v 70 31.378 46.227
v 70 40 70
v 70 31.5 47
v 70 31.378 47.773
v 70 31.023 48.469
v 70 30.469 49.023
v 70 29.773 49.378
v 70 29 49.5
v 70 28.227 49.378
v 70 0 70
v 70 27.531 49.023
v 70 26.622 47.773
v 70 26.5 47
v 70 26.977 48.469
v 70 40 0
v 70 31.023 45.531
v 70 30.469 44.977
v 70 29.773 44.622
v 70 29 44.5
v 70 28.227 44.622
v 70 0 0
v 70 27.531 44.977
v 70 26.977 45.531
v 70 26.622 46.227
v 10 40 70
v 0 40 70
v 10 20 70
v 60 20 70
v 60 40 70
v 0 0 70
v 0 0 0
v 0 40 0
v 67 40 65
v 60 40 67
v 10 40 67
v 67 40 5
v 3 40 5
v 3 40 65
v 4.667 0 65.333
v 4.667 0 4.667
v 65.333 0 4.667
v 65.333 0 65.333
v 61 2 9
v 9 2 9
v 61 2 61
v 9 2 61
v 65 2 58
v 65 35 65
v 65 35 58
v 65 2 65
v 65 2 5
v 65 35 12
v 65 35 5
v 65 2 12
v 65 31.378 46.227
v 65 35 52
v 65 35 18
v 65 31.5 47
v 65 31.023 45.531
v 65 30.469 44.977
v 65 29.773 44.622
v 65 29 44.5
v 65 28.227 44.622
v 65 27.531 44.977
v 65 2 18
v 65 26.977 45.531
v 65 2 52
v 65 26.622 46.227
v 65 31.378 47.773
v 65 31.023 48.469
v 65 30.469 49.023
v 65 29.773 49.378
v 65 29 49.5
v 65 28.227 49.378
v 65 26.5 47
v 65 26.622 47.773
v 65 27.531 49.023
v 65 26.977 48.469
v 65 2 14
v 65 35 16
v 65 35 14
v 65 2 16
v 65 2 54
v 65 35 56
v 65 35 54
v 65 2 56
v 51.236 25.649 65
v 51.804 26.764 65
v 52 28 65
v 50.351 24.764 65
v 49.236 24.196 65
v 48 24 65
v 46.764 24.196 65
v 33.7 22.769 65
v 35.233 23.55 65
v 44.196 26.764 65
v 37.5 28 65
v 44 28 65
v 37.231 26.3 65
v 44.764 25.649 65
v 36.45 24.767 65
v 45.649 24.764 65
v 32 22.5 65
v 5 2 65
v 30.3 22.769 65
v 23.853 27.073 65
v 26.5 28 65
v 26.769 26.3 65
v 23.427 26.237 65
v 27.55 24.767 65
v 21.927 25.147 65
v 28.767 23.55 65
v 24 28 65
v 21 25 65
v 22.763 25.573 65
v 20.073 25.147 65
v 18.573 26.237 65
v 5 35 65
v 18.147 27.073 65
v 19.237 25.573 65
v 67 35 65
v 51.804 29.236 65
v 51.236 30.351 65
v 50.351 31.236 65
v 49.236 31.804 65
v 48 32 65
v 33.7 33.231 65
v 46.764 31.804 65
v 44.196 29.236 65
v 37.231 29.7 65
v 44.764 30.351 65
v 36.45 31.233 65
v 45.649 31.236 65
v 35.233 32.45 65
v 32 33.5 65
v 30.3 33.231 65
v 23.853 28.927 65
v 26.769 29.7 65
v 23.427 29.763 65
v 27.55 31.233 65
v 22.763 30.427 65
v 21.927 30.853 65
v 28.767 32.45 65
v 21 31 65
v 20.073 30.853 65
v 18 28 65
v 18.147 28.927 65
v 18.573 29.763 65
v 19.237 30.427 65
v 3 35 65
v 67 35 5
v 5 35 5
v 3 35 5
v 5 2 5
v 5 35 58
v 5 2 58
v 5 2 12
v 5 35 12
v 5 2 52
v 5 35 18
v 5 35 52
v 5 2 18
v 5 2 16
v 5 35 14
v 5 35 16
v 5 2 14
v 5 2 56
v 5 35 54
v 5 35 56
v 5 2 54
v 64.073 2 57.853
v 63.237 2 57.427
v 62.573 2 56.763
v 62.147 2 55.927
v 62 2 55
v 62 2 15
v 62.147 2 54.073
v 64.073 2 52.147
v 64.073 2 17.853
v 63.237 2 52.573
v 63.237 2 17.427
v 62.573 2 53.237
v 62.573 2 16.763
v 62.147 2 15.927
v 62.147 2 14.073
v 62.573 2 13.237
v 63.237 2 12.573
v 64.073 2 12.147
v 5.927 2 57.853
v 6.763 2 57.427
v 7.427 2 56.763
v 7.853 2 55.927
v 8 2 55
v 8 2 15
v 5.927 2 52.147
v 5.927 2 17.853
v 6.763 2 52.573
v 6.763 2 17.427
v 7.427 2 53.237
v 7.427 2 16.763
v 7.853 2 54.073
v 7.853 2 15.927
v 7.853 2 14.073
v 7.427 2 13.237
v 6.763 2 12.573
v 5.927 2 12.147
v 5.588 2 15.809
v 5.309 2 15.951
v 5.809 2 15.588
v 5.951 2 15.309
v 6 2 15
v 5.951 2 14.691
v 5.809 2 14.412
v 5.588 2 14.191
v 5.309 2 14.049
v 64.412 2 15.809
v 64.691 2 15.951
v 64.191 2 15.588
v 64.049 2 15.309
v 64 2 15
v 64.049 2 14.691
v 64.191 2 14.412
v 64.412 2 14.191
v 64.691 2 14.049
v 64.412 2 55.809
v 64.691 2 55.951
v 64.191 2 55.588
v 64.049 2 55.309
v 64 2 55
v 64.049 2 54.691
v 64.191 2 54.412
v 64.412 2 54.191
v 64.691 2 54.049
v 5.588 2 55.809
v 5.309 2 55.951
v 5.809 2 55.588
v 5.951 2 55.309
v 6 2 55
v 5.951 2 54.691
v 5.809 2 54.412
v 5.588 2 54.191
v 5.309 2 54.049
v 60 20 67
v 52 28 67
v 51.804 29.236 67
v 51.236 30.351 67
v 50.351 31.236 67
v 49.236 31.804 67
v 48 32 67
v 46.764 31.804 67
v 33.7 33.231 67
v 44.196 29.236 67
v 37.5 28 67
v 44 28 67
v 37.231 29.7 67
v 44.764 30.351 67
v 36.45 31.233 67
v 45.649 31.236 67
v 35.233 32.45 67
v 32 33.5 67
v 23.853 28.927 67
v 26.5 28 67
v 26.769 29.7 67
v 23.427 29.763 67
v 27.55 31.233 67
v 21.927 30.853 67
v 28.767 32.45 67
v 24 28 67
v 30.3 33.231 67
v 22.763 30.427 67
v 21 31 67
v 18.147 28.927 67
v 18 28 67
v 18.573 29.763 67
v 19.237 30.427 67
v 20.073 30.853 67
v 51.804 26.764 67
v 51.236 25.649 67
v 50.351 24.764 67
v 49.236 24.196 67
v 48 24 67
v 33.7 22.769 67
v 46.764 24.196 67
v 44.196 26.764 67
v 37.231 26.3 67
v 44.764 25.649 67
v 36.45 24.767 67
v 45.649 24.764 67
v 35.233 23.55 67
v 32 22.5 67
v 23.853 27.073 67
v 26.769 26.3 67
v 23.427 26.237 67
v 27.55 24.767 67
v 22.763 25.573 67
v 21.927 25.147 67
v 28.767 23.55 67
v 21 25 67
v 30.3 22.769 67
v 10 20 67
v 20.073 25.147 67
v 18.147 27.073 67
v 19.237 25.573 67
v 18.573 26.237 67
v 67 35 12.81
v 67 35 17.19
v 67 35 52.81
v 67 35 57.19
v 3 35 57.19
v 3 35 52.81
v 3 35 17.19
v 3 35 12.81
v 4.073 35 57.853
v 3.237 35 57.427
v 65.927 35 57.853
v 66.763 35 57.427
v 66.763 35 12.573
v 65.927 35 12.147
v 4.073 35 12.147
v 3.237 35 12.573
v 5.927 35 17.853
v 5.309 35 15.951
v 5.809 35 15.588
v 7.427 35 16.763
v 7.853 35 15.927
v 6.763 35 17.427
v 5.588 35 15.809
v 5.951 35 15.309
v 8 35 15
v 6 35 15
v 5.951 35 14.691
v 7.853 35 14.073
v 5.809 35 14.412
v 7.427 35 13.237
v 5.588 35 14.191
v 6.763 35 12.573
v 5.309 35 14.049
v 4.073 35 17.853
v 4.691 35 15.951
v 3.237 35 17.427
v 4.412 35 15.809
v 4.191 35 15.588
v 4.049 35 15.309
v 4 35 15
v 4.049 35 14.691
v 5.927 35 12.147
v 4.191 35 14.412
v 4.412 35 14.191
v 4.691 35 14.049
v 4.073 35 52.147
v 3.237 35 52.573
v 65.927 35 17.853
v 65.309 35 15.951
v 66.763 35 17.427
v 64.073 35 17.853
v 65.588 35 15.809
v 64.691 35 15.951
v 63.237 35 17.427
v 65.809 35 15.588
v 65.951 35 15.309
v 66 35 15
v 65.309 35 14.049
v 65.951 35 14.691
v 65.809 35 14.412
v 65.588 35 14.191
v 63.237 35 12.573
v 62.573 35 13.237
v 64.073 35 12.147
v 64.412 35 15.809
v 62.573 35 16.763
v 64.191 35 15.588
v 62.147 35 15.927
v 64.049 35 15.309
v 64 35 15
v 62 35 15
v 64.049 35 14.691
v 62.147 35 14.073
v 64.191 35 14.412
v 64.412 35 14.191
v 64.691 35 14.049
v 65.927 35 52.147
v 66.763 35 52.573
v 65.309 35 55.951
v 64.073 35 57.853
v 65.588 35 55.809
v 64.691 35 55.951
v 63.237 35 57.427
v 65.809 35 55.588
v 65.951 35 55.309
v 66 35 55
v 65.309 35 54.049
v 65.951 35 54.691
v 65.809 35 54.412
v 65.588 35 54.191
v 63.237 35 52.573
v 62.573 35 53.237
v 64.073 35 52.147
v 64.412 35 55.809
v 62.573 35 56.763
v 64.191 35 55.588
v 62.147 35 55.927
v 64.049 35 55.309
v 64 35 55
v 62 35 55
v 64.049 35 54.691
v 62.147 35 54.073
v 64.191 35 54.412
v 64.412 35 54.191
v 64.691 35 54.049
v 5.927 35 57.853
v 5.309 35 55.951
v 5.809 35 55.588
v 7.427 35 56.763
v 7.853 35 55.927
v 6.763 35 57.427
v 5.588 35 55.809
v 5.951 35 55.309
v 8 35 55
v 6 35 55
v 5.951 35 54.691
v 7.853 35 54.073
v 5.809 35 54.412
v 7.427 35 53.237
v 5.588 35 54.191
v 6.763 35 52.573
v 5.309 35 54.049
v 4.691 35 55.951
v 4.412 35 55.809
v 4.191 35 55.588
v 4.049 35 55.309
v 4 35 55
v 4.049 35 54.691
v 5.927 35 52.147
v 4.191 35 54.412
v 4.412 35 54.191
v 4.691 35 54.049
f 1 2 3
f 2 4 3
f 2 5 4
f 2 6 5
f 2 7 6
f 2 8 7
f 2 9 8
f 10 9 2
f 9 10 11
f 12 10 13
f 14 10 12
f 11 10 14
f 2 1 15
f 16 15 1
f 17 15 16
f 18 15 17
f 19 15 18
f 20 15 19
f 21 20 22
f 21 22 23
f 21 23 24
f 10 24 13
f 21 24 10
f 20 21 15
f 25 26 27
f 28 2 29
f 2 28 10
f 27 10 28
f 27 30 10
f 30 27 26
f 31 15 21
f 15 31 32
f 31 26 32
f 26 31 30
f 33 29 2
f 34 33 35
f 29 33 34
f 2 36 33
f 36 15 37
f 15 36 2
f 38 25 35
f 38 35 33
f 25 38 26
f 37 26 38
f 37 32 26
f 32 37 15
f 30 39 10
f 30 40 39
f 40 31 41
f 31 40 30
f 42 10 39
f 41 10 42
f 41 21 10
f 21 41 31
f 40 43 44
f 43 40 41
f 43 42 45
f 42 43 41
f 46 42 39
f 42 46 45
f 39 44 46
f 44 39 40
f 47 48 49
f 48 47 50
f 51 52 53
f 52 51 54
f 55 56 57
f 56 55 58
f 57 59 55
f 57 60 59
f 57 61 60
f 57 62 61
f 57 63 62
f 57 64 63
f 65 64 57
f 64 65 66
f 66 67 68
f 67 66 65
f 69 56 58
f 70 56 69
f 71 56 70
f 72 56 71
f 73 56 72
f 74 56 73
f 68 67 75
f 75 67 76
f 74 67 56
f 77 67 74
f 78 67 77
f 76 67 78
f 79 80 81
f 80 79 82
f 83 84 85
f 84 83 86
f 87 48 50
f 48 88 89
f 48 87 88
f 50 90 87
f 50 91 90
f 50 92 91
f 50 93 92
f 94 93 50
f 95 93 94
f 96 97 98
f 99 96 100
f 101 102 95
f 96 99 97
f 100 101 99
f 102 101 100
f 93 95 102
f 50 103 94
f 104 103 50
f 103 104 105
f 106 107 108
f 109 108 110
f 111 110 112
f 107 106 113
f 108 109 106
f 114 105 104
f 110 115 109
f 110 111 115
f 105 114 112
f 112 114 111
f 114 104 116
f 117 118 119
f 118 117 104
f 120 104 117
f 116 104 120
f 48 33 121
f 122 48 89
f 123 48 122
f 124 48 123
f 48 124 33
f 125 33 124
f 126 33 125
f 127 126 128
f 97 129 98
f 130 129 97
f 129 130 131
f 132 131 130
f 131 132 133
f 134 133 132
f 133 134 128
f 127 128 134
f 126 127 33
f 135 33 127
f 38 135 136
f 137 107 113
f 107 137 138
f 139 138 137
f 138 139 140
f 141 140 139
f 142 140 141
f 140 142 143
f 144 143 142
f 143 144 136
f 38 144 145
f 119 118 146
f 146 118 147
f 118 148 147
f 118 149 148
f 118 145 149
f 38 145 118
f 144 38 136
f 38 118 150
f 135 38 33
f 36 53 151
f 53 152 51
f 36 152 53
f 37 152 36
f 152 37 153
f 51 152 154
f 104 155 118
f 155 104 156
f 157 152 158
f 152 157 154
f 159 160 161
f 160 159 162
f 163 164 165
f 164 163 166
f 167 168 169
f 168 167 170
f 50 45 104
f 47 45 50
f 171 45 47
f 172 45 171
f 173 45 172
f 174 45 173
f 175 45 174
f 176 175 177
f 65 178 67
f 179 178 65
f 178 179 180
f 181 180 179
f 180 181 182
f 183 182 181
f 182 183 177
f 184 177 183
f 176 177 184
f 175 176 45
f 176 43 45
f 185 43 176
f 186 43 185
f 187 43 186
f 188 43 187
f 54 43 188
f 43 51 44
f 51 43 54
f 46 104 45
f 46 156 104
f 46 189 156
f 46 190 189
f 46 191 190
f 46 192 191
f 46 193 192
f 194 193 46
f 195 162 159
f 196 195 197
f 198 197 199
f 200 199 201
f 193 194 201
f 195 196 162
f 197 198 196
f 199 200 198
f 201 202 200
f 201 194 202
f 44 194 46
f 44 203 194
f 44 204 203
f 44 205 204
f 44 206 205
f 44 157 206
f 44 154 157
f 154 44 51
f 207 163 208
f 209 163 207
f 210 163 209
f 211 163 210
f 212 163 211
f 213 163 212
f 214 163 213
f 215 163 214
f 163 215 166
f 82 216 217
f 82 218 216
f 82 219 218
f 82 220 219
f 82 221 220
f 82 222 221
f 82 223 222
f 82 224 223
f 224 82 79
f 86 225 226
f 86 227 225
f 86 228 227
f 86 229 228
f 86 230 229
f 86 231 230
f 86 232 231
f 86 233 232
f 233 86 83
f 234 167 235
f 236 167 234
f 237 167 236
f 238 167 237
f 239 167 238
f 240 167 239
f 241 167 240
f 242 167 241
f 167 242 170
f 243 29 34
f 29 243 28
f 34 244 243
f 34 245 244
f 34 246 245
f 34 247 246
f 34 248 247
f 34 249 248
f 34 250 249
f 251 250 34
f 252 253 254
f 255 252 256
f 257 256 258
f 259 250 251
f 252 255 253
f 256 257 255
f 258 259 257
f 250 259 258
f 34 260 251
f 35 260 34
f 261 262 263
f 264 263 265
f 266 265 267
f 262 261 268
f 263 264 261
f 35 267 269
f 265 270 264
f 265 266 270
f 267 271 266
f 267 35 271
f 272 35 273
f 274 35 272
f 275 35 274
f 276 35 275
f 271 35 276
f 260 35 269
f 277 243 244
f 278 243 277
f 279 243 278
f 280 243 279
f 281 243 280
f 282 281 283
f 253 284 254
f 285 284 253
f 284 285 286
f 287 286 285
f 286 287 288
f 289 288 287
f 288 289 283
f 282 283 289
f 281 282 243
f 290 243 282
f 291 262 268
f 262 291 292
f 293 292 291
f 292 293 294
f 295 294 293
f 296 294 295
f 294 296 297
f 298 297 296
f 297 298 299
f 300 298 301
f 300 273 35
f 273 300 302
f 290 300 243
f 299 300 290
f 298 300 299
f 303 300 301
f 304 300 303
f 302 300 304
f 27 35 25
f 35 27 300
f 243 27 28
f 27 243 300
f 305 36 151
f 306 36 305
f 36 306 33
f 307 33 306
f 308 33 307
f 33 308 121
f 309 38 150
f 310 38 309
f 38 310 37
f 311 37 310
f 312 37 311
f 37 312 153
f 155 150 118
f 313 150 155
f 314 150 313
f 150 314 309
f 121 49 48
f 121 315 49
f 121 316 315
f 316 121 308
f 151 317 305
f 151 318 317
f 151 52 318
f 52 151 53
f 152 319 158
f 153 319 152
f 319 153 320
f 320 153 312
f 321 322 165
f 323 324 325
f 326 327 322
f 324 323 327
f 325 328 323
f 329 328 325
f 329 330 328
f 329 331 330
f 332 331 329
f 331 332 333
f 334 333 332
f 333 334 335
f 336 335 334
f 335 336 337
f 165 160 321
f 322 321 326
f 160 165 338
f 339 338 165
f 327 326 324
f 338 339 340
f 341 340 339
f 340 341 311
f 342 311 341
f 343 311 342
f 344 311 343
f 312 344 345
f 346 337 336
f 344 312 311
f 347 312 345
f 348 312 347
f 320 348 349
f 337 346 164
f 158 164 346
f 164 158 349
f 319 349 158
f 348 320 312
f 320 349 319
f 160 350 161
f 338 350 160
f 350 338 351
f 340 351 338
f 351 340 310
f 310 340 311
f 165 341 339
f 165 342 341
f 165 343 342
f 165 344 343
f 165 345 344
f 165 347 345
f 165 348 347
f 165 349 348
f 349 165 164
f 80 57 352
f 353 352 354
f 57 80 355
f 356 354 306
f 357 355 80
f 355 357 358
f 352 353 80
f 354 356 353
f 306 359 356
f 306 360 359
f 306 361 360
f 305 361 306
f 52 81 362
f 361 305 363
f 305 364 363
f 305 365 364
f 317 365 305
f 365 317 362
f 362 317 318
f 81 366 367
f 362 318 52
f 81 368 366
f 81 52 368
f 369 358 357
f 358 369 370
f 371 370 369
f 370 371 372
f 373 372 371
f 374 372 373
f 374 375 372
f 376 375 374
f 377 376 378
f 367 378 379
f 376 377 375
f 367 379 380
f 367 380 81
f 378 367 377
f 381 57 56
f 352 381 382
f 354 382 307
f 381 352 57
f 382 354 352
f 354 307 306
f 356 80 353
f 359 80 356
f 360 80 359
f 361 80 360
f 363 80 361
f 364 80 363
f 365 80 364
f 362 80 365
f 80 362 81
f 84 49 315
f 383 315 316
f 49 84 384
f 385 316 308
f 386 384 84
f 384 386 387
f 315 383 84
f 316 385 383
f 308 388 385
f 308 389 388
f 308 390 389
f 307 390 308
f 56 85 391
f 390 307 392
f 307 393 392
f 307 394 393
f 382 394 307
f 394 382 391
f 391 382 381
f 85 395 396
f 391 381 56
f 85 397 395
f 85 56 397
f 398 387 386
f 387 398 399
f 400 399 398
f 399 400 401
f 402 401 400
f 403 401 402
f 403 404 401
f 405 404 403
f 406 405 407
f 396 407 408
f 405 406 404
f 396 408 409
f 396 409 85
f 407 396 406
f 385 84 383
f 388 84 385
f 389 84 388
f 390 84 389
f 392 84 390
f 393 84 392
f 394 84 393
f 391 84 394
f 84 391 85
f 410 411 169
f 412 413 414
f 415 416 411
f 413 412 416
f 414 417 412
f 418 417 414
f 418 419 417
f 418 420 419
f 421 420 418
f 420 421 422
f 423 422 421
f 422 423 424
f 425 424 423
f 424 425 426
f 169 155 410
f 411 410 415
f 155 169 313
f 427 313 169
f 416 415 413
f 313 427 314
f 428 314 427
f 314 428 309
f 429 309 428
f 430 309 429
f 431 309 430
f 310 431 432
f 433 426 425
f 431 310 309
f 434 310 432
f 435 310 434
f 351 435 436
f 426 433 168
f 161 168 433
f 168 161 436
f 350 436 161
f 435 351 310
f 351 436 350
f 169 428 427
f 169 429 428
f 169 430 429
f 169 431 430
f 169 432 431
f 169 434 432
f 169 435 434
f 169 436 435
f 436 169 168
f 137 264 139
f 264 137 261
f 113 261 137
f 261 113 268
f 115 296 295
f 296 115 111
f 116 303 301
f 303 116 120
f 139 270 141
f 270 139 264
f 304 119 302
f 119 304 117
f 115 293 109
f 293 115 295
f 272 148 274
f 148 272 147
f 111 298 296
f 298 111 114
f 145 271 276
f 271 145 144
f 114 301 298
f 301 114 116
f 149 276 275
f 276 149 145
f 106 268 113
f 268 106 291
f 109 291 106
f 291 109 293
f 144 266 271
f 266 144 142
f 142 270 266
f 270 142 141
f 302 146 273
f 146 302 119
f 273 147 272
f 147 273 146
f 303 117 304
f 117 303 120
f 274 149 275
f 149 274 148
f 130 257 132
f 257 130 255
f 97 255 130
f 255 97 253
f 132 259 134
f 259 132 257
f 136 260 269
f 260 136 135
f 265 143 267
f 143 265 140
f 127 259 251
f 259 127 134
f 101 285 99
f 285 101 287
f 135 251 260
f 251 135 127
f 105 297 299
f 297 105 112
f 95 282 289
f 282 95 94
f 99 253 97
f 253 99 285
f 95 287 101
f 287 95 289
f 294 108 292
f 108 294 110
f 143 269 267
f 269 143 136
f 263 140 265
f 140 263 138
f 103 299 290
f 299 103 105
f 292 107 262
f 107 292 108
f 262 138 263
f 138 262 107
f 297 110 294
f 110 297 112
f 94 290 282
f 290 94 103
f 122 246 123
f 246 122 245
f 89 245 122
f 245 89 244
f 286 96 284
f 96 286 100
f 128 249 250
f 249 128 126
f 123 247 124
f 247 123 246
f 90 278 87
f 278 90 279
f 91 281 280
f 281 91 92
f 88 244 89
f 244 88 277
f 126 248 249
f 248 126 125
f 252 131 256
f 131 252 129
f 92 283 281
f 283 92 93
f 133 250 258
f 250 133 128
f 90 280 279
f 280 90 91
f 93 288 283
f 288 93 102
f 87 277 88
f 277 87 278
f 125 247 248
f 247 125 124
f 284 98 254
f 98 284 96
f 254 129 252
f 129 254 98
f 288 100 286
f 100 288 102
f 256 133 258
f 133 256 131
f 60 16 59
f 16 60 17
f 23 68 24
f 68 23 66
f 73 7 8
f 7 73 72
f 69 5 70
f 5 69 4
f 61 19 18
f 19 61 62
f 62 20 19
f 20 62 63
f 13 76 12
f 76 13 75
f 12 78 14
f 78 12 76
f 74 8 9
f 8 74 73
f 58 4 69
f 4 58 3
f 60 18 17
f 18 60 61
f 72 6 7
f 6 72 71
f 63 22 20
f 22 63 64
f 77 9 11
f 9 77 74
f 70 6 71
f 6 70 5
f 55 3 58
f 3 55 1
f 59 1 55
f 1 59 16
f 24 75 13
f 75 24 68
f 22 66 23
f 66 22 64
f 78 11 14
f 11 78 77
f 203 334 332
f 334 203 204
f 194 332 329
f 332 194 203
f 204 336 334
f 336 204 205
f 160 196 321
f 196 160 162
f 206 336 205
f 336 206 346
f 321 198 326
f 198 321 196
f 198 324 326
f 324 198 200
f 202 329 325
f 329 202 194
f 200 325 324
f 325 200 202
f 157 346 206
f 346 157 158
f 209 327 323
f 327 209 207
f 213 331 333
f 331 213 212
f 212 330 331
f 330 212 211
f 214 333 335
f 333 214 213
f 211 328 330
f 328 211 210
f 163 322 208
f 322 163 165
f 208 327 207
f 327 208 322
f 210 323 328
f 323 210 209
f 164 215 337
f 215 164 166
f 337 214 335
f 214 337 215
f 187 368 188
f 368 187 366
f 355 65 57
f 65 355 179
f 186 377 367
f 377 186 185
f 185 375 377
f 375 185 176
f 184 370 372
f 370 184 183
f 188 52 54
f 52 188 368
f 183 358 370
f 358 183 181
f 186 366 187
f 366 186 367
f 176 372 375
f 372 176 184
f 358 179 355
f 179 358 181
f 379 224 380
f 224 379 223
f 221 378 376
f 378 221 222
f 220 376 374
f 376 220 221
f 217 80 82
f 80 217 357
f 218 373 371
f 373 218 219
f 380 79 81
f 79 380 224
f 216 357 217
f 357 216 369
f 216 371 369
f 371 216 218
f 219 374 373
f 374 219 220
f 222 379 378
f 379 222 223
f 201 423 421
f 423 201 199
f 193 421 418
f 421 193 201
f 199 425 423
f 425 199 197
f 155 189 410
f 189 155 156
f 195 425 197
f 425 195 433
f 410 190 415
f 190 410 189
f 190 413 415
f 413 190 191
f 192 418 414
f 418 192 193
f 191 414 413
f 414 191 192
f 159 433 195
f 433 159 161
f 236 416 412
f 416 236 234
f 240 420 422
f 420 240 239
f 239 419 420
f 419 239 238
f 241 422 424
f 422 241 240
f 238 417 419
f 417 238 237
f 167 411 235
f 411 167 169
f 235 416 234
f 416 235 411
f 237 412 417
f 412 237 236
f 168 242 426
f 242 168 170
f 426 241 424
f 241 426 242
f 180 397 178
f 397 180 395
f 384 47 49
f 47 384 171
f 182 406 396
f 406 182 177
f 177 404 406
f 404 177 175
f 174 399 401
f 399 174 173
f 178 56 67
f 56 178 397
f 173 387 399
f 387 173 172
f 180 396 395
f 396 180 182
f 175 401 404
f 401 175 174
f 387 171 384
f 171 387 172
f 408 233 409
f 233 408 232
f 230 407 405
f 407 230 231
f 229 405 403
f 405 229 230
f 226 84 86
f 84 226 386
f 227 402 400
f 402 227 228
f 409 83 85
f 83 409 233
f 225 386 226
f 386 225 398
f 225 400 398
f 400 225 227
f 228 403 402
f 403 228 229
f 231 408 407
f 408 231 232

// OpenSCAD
amp_height = 70;
amp_width = 70;
amp_depth = 40;
speaker_radius = 20;
speaker_diam = speaker_radius * 2;

front_bevel_width = 5;

inner_height = amp_height - 2 * front_bevel_width;
inner_width = amp_width - 2 * front_bevel_width;

// From elmom here: https://github.com/elmom/MCAD/blob/master/regular_shapes.scad
module square_pyramid(base_x, base_y,height)
{
  w=base_x/2;
  h=base_y/2;
  polyhedron(points=[[-w,-h,0],[-w,h,0],[w,h,0],[w,-h,0],[0,0,height]],triangles=[[0,3,2,1], [0,1,4], [1,2,4], [2,3,4], [3,0,4]]);
}
module screw_hole(xoff, zoff) {
 translate([front_bevel_width + xoff, 2, front_bevel_width + zoff])
  rotate([-90,0,0])
   difference() {
    cylinder(r=3, h=amp_depth - front_bevel_width - 2, $fn=20);
    cylinder(r=1, h=amp_depth - front_bevel_width - 2, $fn=20);
   }
}

module cab() {
 difference() {
  cube(size=[amp_width, amp_depth, amp_height]);
  translate([inner_width/2 + front_bevel_width, -1, inner_height/2 + front_bevel_width])
   rotate(a=[-90,0,0])
    square_pyramid(inner_width+front_bevel_width,inner_height+front_bevel_width,15);
  translate([front_bevel_width, front_bevel_width-3, front_bevel_width])
   cube(size=[inner_width, amp_depth+2, inner_height]);
  translate([front_bevel_width*2, amp_depth/2, amp_height-front_bevel_width+2])
   cube(size=[inner_width - 2 * front_bevel_width, amp_depth, front_bevel_width]);
  translate([front_bevel_width - 2, amp_depth - front_bevel_width, front_bevel_width])
   cube(size=[inner_width + 4, front_bevel_width+1, inner_height]);
  translate([amp_width - 49, amp_depth - 12, amp_height - 10])
   #cylinder(r=3, h=amp_depth - front_bevel_width - 2, $fn=20);
  translate([amp_width - 38, amp_depth - 12, amp_height - 10])
   #cylinder(r=5.5, h=amp_depth - front_bevel_width - 2, $fn=20);
  translate([amp_width - 22, amp_depth - 12, amp_height - 10])
   #cylinder(r=4, h=amp_depth - front_bevel_width - 2, $fn=20);
  translate([amp_width - front_bevel_width - 1, amp_depth - 11, inner_height - 13])
   rotate([0,90,0])
    #cylinder(r=2.5, h=amp_depth - front_bevel_width - 2, $fn=20);
 }
 screw_hole(0, 10);
 screw_hole(inner_width, 10);
 screw_hole(0, inner_height - 10);
 screw_hole(inner_width, inner_height - 10);

}

module screw_hole_back(xoff, zoff) {
 translate([2 + xoff, -1, zoff])
  rotate([-90,0,0])
   cylinder(r=1, h=front_bevel_width + 2, $fn=20);
}

module back() {
 translate([front_bevel_width-2, amp_depth-front_bevel_width, front_bevel_width]) {
  difference() {
   cube(size=[inner_width + 4, front_bevel_width, inner_height]);
   screw_hole_back(0, 10);
   screw_hole_back(inner_width, 10);
   screw_hole_back(0, inner_height - 10);
   screw_hole_back(inner_width, inner_height - 10);
  }
 }
}

module innards() {
 difference() {
  union() {
   cube(size=[inner_width, amp_depth/2, inner_height/3]);
   translate([inner_width/2 - 5, 0, 0])
    cube(size=[10, front_bevel_width + 5, speaker_diam + front_bevel_width + 2]);
  }
  translate([inner_width/2, -1, speaker_radius + front_bevel_width])
   rotate([-90,0,0])
    #cylinder(r=speaker_radius, h=front_bevel_width + 3, $fn=50);
  translate([(inner_width - speaker_diam) / 2 - 1, 10, front_bevel_width])
   #cube(size=[speaker_diam + 2, amp_depth/2, inner_height/3]);
 }
}

//rotate([90,0,0])
 cab();
//back();
//innards();
